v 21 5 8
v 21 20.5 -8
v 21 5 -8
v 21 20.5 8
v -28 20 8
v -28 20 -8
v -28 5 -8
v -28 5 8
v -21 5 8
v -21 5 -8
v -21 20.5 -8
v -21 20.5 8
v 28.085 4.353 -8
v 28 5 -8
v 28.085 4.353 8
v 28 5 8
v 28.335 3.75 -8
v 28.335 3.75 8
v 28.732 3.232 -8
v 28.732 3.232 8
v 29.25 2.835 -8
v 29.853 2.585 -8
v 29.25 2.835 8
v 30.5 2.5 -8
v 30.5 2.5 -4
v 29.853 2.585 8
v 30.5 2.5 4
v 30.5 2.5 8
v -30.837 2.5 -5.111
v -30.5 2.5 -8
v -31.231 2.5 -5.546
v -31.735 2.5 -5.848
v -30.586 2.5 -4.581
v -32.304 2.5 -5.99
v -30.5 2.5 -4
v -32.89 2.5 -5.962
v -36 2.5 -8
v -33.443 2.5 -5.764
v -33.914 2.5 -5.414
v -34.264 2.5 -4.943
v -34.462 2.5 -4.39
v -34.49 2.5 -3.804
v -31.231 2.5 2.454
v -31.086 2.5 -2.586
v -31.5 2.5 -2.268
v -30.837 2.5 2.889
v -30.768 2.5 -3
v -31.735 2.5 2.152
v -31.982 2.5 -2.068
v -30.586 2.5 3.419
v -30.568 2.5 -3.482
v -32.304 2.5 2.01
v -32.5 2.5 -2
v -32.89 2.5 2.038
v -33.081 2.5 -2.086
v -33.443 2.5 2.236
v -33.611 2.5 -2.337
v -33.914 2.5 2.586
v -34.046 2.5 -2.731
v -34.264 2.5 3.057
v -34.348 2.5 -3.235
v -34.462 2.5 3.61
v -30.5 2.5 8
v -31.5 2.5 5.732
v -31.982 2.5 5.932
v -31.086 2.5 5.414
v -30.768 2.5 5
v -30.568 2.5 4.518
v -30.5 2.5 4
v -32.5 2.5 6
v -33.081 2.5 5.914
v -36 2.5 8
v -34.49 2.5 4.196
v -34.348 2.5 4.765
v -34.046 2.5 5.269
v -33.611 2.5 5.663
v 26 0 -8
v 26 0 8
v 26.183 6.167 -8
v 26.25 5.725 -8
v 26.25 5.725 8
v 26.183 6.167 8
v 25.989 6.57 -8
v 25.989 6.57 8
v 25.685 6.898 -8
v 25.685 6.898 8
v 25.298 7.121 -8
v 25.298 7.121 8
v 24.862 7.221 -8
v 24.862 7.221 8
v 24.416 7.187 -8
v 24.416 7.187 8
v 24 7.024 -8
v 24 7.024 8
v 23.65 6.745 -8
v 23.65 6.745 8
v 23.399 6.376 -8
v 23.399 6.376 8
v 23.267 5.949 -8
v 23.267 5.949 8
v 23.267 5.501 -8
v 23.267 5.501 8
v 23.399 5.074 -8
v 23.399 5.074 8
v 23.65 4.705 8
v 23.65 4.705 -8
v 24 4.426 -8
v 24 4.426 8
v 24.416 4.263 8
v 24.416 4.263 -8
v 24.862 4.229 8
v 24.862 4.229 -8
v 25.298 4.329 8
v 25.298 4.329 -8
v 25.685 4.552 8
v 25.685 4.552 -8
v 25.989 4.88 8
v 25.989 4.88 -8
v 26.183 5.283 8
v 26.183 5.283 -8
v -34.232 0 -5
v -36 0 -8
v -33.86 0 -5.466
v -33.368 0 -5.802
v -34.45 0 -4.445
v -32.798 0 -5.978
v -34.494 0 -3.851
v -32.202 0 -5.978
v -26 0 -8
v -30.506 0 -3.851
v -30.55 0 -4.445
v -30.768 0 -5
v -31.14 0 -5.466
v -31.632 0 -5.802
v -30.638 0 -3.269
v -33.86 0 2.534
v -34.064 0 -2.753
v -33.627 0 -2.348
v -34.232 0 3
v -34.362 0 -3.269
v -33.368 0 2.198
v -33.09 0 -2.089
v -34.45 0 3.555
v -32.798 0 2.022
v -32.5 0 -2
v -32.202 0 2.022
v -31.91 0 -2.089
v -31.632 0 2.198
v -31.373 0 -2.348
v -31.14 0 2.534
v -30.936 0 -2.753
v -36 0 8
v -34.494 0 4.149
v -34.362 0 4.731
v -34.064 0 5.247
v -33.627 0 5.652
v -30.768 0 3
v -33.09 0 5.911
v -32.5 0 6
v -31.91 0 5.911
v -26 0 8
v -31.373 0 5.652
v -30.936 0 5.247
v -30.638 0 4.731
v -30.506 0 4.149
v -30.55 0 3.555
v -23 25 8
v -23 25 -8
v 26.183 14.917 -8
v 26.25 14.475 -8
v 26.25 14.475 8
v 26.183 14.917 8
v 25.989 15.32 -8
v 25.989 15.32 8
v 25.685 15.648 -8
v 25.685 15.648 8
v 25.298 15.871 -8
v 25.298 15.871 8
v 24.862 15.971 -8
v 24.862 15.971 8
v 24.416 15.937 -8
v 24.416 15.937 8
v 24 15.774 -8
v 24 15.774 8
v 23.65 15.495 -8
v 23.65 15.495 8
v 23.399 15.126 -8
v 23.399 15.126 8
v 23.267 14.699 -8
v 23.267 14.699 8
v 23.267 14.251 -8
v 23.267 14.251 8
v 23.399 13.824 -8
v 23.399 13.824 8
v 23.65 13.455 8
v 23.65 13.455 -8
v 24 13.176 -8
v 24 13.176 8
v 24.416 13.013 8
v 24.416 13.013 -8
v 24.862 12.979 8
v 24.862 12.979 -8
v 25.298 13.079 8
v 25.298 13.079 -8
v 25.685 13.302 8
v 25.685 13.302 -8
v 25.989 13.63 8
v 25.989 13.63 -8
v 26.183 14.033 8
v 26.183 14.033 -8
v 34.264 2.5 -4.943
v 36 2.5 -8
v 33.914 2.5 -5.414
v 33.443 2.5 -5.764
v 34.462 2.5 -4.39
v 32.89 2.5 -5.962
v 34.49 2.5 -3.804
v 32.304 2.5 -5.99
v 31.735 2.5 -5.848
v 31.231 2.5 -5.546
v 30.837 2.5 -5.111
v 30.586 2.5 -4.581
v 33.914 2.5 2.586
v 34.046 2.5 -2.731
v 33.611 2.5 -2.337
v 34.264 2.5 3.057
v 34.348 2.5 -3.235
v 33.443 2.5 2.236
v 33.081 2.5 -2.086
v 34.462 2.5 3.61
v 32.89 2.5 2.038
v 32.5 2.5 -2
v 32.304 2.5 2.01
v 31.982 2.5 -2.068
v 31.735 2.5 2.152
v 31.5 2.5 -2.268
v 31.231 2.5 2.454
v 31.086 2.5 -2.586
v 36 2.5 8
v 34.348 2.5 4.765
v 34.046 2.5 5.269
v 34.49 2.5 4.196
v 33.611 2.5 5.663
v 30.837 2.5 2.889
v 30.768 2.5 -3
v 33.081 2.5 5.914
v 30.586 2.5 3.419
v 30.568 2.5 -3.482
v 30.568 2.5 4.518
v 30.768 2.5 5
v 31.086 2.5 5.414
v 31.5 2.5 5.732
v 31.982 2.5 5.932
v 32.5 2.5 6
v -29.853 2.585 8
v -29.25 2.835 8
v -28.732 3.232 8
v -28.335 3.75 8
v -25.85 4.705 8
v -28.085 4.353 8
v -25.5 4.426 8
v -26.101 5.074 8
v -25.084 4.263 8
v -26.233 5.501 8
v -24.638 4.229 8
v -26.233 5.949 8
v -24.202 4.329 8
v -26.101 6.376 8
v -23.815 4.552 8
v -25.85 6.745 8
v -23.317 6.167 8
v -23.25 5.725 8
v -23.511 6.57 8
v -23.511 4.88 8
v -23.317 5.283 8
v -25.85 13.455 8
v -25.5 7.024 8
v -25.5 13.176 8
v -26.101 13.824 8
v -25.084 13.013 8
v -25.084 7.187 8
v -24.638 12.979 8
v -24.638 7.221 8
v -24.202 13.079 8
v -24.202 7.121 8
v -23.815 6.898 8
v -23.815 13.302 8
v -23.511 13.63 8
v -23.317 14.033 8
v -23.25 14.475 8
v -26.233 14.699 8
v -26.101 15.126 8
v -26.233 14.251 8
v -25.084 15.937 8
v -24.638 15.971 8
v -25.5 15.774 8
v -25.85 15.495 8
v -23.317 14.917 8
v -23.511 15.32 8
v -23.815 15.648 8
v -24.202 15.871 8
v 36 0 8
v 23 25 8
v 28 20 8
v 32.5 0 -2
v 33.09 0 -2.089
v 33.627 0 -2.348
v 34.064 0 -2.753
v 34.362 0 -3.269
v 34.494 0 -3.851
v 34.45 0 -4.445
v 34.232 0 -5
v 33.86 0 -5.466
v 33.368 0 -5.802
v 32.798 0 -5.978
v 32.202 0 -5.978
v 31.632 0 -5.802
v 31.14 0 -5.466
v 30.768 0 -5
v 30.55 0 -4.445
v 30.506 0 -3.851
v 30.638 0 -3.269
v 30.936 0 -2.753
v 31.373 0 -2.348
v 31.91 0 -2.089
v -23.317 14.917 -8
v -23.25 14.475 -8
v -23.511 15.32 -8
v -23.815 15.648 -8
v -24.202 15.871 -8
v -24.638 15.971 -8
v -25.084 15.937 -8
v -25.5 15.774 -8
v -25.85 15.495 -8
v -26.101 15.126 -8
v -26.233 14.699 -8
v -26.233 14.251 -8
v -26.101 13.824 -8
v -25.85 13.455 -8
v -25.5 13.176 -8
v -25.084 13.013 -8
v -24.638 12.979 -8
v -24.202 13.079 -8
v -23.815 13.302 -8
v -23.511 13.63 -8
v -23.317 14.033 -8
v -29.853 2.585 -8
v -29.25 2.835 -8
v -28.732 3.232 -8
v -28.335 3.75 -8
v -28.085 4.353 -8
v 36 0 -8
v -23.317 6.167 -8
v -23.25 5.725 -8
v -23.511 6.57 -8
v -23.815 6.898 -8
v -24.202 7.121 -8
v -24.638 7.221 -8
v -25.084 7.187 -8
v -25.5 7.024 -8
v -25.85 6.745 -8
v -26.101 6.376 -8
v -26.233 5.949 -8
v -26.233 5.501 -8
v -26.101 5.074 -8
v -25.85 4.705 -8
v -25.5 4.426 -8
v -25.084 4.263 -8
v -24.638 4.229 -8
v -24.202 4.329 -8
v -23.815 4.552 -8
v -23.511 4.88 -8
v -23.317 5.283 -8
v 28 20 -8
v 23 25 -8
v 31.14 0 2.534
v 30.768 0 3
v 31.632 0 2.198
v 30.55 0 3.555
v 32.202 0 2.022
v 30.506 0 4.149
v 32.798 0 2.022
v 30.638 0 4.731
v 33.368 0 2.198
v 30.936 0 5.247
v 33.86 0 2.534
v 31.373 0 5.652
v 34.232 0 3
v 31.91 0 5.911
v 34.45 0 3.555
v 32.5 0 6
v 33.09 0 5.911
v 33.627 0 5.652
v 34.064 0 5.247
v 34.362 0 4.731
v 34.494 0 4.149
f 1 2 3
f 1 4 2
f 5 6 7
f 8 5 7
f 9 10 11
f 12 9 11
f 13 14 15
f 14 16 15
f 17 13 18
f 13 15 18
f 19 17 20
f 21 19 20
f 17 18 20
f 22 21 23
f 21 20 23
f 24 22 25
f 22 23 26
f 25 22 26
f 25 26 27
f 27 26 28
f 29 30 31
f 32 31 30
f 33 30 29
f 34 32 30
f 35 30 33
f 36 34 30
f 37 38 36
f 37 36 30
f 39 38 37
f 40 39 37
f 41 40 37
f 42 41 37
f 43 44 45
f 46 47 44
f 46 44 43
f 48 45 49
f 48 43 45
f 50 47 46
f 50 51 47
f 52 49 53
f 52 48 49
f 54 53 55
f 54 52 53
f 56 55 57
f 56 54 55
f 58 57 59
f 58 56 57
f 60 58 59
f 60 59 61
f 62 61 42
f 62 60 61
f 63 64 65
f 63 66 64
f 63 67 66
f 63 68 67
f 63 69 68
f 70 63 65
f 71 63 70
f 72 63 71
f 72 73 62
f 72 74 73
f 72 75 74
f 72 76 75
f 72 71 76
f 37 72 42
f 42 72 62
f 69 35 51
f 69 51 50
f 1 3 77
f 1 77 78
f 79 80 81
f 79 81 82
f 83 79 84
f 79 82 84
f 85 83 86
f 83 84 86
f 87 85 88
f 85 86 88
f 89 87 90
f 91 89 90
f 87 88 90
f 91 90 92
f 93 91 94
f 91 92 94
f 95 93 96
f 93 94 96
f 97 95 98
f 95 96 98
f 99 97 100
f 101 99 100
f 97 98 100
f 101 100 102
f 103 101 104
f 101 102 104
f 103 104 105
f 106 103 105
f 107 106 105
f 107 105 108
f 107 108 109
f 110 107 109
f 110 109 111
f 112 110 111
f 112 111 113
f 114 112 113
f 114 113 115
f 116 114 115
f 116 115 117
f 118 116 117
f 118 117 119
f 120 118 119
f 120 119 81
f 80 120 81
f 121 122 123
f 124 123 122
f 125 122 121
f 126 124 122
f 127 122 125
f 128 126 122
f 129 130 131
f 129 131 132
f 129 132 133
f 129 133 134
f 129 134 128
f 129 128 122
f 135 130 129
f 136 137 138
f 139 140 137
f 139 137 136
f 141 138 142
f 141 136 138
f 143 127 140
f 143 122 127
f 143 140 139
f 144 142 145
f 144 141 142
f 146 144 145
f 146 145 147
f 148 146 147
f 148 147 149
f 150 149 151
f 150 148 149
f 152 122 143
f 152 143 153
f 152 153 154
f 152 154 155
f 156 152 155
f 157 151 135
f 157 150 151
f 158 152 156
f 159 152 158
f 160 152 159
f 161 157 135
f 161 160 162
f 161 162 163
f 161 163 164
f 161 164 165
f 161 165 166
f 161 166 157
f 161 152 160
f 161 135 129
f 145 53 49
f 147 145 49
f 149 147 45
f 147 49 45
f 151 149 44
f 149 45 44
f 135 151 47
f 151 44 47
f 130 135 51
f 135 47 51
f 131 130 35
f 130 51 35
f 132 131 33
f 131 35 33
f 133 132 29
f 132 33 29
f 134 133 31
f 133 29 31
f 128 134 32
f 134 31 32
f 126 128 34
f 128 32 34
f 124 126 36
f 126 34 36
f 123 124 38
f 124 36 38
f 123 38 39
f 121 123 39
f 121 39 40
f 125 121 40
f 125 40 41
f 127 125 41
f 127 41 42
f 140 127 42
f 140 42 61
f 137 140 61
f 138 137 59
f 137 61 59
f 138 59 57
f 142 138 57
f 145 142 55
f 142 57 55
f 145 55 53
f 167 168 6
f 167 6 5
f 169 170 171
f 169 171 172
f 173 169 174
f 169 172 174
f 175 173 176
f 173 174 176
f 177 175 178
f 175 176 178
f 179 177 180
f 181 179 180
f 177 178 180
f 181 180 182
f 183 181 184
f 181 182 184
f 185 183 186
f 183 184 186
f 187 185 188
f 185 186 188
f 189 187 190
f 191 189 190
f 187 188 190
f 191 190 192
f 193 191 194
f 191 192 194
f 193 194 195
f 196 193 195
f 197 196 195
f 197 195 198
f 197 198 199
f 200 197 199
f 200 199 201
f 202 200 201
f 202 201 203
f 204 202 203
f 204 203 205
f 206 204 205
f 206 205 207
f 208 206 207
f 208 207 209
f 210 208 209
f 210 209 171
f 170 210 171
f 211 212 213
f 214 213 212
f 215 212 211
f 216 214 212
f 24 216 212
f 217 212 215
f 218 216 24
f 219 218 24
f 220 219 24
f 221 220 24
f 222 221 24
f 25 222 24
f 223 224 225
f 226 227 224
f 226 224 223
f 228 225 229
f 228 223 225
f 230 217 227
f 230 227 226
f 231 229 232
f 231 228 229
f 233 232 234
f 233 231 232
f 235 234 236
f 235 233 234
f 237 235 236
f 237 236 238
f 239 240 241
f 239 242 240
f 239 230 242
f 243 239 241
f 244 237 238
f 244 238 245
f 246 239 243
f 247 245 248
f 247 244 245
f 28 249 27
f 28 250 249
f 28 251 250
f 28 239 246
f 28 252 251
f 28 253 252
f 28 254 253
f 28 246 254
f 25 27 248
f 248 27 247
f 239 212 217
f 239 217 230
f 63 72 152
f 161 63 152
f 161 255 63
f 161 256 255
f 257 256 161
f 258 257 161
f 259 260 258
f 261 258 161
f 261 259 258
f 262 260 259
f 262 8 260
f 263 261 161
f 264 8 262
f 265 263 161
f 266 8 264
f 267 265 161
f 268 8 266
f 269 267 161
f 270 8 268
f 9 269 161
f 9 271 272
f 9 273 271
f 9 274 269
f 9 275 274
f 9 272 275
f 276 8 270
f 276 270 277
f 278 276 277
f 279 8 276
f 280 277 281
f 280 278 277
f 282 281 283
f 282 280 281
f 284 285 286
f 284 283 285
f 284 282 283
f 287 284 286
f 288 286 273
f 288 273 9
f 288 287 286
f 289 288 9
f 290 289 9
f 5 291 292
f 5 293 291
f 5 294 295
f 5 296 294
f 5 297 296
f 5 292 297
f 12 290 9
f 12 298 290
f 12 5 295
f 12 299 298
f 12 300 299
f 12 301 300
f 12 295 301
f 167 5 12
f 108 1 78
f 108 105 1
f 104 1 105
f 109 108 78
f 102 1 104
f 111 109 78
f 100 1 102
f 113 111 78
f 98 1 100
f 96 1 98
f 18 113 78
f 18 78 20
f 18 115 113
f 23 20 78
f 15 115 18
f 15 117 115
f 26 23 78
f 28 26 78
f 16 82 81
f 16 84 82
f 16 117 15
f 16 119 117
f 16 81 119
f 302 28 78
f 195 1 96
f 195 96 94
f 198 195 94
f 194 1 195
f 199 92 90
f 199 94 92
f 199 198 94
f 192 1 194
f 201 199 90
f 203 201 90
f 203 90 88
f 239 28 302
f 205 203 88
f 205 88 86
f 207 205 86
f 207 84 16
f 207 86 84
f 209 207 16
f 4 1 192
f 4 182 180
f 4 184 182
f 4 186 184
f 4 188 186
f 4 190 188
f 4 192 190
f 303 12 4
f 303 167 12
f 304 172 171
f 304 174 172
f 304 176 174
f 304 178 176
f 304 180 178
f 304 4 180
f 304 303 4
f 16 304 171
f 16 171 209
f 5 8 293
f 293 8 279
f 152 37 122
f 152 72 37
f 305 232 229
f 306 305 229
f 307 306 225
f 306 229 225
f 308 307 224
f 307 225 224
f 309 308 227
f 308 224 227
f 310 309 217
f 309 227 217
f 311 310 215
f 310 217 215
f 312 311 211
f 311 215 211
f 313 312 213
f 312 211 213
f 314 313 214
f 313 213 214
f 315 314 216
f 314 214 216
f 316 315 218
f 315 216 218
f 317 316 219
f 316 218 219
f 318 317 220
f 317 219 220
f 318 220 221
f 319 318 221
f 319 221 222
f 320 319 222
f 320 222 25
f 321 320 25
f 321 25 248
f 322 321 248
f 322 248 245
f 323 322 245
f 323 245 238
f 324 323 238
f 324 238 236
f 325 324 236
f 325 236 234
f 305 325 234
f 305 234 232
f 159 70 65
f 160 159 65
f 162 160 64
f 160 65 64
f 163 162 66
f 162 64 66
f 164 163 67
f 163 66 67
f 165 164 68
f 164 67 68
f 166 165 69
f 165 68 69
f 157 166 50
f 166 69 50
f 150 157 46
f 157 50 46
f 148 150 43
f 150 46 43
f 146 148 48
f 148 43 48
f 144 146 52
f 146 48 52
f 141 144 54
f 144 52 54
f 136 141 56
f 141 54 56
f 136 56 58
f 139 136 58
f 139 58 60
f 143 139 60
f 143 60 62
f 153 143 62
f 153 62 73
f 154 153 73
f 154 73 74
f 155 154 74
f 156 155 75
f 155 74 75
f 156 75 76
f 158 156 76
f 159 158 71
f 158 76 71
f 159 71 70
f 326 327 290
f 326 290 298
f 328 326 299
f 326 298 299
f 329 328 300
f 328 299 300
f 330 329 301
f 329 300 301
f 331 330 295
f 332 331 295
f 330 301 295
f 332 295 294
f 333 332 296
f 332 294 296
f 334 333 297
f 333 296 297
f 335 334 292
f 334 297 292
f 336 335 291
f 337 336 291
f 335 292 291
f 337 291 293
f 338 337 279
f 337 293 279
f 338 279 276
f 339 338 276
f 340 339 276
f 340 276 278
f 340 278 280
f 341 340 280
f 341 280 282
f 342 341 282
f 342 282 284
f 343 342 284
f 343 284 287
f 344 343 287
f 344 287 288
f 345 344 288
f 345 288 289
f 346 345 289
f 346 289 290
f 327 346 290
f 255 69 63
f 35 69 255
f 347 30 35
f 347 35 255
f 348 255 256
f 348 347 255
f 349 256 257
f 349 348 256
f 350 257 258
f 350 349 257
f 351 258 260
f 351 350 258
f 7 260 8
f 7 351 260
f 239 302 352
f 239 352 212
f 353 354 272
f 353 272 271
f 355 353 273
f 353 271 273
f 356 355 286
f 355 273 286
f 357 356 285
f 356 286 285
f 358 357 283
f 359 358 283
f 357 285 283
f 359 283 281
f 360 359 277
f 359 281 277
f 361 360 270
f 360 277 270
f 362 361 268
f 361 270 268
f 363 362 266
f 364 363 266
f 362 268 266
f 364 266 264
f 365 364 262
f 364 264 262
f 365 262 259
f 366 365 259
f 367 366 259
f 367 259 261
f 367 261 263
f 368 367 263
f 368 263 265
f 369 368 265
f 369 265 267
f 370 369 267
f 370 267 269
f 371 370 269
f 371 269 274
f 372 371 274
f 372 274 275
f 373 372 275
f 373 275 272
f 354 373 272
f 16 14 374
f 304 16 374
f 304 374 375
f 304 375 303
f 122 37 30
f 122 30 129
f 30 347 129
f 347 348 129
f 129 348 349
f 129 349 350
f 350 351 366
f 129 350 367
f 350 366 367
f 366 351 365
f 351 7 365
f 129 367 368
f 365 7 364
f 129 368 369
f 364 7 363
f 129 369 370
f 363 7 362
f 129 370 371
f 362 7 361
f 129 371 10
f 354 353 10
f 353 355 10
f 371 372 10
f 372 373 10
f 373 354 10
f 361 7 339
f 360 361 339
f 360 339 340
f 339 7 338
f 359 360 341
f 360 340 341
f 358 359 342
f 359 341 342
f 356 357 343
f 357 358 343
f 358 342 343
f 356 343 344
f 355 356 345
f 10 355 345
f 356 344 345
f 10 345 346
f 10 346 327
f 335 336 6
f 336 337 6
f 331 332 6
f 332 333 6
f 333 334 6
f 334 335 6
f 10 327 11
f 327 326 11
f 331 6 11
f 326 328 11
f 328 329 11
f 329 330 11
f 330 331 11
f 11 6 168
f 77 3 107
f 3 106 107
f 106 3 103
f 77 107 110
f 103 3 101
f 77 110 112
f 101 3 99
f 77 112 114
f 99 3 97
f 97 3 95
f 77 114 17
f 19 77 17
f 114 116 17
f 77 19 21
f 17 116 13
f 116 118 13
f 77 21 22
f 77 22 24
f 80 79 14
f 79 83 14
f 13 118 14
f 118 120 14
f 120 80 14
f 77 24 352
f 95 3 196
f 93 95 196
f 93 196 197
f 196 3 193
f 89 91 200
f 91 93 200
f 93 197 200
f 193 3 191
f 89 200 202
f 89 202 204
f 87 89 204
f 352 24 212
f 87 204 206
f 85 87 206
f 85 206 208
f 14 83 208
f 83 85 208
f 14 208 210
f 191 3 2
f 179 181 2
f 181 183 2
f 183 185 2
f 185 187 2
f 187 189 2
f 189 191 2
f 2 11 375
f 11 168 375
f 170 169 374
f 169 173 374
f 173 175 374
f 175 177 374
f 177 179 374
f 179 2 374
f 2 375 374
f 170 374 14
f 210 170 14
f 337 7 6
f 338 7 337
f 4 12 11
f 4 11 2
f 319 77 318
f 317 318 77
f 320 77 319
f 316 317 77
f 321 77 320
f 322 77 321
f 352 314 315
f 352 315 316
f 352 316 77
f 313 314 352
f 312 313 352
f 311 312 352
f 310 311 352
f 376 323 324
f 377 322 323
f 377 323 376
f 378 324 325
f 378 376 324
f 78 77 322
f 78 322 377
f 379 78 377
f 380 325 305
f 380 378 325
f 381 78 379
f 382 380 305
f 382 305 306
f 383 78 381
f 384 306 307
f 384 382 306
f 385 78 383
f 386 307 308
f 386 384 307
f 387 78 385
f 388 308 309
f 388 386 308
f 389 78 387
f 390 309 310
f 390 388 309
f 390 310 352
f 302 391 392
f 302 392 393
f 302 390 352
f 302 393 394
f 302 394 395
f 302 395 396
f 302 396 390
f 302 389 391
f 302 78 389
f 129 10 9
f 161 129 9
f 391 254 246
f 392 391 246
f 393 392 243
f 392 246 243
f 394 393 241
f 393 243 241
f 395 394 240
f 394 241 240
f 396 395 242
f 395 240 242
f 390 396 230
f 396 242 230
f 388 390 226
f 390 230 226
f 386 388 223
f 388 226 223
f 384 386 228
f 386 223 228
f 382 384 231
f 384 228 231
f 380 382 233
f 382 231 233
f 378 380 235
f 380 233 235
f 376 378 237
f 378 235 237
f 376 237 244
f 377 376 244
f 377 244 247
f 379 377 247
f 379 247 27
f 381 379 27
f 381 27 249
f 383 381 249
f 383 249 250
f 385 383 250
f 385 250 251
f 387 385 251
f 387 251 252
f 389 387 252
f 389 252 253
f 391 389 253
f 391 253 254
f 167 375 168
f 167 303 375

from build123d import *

# Parameters (mm, degrees)
BOSS_EXTRUDE1_DEPTH = 8
CHAMFER5_SIZE       = 5
FILLET1_R           = 2.5
SKETCH2_R           = 1.5
CUT_EXTRUDE1_DEPTH  = 47.658332589
SKETCH3_R           = 2
CUT_EXTRUDE2_DEPTH  = 44.200115741


with BuildPart() as part:
    # Sketch1 → Boss-Extrude1 (new, symmetric)
    with BuildSketch(Plane.XY):
        Polygon((-36, 0), (-21, 0), (-21, 20.5), (21, 20.5), (21, 0), (36, 0), (36, 2.5), (28, 2.5), (28, 25), (-28, 25), (-28, 2.5), (-36, 2.5), align=None)
    extrude(amount=BOSS_EXTRUDE1_DEPTH, both=True)

    # Chamfer5
    chamfer5_edges = [part.edges().sort_by_distance(p)[0] for p in [
        (-28, 25, 0),
        (28, 25, 0),
        (21, 0, 0),
        (-21, 0, 0),
    ]]
    chamfer(chamfer5_edges, length=CHAMFER5_SIZE)

    # Fillet1
    fillet1_edges = [part.edges().sort_by_distance(p)[0] for p in [
        (-28, 2.5, 0),
        (28, 2.5, 0),
    ]]
    fillet(fillet1_edges, radius=FILLET1_R)

    # Sketch2 → Cut-Extrude1 (cut, through all)
    with BuildSketch(Plane.XY.offset(8)):
        with Locations((-24.75, 14.475)):
            Circle(SKETCH2_R)
        with Locations((-24.75, 5.725)):
            Circle(SKETCH2_R)
        with Locations((24.75, 14.475)):
            Circle(SKETCH2_R)
        with Locations((24.75, 5.725)):
            Circle(SKETCH2_R)
    extrude(amount=-CUT_EXTRUDE1_DEPTH, mode=Mode.SUBTRACT)

    # Sketch3 → Cut-Extrude2 (cut, through all)
    with BuildSketch(Plane(origin=(0, 2.5, 0), x_dir=(1, 0, 0), z_dir=(0, 1, 0))):
        with Locations(Location((32.5, 4, 0), (0, 0, 270))):
            Circle(SKETCH3_R)
        with Locations(Location((32.5, -4, 0), (0, 0, 270))):
            Circle(SKETCH3_R)
        with Locations(Location((-32.5, 4, 0), (0, 0, 270))):
            Circle(SKETCH3_R)
        with Locations(Location((-32.5, -4, 0), (0, 0, 270))):
            Circle(SKETCH3_R)
    extrude(amount=-CUT_EXTRUDE2_DEPTH, mode=Mode.SUBTRACT)


solid = part.part
